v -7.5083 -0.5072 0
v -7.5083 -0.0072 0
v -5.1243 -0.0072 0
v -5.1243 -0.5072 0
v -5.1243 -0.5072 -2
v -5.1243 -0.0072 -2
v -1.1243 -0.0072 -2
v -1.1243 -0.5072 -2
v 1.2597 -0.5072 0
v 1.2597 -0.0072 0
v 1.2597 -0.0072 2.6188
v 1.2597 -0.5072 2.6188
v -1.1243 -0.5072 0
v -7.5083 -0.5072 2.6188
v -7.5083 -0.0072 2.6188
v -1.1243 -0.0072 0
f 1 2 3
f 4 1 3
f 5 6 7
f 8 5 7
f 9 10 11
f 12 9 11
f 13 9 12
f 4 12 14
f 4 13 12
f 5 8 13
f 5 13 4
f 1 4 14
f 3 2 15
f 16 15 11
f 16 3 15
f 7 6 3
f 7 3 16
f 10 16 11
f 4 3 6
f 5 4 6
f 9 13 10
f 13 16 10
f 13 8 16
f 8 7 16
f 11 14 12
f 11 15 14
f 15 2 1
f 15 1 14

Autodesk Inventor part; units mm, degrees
ref_plane "YZ Plane" through (0, 0, 0) normal (1, 0, 0) x (0, 1, 0)
ref_plane "XZ Plane" through (0, 0, 0) normal (0, 1, 0) x (-1, 0, 0)
ref_plane "XY Plane" through (0, 0, 0) normal (0, 0, 1) x (1, 0, 0)
sketch "Sketch1" plane through (0, 0, 0) normal (0, 0, 1) x (1, 0, 0)
  line L0 (-10.6243, -0.0072) -> (4.3757, -0.0072)
  line L1 (4.3757, -0.0072) -> (4.3757, -0.5072)
  line L2 (4.3757, -0.5072) -> (-10.6243, -0.5072)
  line L3 (-10.6243, -0.5072) -> (-10.6243, -0.0072)
  point P0 (0, 0)
  dimension "d0" = 0.5
  dimension "d1" = 15
extrude "Extrusion1" add sketch "Sketch1" along normal blind 10
sketch "Sketch2" plane through (-10.6243, -0.0072, 0) normal (0, 1, 0) x (1, 0, 0)
  line L0 (0, 0) -> (15, 0) construction
  line L1 (7.5, 0) -> (7.5, -10.8529) construction
  line L2 (15, -5.4265) -> (-1.0951, -5.4265) construction
  line L3 (5.5, 2) -> (9.5, 2)
  line L4 (9.5, 2) -> (9.5, 0)
  line L5 (9.5, 0) -> (5.5, 0)
  line L6 (5.5, 0) -> (5.5, 2)
  point P0 (10.6243, 0)
  dimension "d4" = 4
  dimension "d5" = 2
extrude "Extrusion2" add sketch "Sketch2" against normal blind 0.5
sketch "Sketch3" plane through (-10.6243, -0.0072, 10) normal (0, 1, 0) x (1, 0, 0)
  line L0 (0, 10) -> (5.5, 10) projected
  line L1 (0, 10) -> (0, 0) projected
  line L2 (15, 0) -> (0, 0) projected
  line L3 (15, 10) -> (15, 0) projected
  line L4 (9.5, 10) -> (15, 10) projected
  line L5 (9.5, 12) -> (9.5, 10) projected
  line L6 (5.5, 12) -> (9.5, 12) projected
  line L7 (5.5, 10) -> (5.5, 12) projected
  line L8 (3.116, 10) -> (3.116, 0)
  line L9 (15, 0) -> (0, 0) projected
  line L10 (15, 10) -> (9.5, 10) projected
  line L11 (11.884, 10) -> (11.884, 0)
  line L12 (5.5, 12) -> (9.5, 12) construction
  line L13 (7.5, 12) -> (7.5, 0) construction
  point P0 (10.6243, 10)
extrude "Extrusion3" cut sketch "Sketch3" against normal blind 1 contours L0 L8 L2 L1 | L11 L4 L3 L2
sketch "Sketch4" plane through (-5.1243, -0.0072, -2) normal (0, 1, 0) x (1, 0, 0)
  line L0 (8.8107, -14.8925) -> (-5.1696, -14.8925)
  line L1 (-5.1696, -14.8925) -> (-5.1696, -4.6188)
  line L2 (-5.1696, -4.6188) -> (8.8107, -4.6188)
  line L3 (8.8107, -4.6188) -> (8.8107, -14.8925)
  point P0 (5.1243, -2)
extrude "Extrusion4" cut sketch "Sketch4" against normal blind 1
properties part number "Side wall"
